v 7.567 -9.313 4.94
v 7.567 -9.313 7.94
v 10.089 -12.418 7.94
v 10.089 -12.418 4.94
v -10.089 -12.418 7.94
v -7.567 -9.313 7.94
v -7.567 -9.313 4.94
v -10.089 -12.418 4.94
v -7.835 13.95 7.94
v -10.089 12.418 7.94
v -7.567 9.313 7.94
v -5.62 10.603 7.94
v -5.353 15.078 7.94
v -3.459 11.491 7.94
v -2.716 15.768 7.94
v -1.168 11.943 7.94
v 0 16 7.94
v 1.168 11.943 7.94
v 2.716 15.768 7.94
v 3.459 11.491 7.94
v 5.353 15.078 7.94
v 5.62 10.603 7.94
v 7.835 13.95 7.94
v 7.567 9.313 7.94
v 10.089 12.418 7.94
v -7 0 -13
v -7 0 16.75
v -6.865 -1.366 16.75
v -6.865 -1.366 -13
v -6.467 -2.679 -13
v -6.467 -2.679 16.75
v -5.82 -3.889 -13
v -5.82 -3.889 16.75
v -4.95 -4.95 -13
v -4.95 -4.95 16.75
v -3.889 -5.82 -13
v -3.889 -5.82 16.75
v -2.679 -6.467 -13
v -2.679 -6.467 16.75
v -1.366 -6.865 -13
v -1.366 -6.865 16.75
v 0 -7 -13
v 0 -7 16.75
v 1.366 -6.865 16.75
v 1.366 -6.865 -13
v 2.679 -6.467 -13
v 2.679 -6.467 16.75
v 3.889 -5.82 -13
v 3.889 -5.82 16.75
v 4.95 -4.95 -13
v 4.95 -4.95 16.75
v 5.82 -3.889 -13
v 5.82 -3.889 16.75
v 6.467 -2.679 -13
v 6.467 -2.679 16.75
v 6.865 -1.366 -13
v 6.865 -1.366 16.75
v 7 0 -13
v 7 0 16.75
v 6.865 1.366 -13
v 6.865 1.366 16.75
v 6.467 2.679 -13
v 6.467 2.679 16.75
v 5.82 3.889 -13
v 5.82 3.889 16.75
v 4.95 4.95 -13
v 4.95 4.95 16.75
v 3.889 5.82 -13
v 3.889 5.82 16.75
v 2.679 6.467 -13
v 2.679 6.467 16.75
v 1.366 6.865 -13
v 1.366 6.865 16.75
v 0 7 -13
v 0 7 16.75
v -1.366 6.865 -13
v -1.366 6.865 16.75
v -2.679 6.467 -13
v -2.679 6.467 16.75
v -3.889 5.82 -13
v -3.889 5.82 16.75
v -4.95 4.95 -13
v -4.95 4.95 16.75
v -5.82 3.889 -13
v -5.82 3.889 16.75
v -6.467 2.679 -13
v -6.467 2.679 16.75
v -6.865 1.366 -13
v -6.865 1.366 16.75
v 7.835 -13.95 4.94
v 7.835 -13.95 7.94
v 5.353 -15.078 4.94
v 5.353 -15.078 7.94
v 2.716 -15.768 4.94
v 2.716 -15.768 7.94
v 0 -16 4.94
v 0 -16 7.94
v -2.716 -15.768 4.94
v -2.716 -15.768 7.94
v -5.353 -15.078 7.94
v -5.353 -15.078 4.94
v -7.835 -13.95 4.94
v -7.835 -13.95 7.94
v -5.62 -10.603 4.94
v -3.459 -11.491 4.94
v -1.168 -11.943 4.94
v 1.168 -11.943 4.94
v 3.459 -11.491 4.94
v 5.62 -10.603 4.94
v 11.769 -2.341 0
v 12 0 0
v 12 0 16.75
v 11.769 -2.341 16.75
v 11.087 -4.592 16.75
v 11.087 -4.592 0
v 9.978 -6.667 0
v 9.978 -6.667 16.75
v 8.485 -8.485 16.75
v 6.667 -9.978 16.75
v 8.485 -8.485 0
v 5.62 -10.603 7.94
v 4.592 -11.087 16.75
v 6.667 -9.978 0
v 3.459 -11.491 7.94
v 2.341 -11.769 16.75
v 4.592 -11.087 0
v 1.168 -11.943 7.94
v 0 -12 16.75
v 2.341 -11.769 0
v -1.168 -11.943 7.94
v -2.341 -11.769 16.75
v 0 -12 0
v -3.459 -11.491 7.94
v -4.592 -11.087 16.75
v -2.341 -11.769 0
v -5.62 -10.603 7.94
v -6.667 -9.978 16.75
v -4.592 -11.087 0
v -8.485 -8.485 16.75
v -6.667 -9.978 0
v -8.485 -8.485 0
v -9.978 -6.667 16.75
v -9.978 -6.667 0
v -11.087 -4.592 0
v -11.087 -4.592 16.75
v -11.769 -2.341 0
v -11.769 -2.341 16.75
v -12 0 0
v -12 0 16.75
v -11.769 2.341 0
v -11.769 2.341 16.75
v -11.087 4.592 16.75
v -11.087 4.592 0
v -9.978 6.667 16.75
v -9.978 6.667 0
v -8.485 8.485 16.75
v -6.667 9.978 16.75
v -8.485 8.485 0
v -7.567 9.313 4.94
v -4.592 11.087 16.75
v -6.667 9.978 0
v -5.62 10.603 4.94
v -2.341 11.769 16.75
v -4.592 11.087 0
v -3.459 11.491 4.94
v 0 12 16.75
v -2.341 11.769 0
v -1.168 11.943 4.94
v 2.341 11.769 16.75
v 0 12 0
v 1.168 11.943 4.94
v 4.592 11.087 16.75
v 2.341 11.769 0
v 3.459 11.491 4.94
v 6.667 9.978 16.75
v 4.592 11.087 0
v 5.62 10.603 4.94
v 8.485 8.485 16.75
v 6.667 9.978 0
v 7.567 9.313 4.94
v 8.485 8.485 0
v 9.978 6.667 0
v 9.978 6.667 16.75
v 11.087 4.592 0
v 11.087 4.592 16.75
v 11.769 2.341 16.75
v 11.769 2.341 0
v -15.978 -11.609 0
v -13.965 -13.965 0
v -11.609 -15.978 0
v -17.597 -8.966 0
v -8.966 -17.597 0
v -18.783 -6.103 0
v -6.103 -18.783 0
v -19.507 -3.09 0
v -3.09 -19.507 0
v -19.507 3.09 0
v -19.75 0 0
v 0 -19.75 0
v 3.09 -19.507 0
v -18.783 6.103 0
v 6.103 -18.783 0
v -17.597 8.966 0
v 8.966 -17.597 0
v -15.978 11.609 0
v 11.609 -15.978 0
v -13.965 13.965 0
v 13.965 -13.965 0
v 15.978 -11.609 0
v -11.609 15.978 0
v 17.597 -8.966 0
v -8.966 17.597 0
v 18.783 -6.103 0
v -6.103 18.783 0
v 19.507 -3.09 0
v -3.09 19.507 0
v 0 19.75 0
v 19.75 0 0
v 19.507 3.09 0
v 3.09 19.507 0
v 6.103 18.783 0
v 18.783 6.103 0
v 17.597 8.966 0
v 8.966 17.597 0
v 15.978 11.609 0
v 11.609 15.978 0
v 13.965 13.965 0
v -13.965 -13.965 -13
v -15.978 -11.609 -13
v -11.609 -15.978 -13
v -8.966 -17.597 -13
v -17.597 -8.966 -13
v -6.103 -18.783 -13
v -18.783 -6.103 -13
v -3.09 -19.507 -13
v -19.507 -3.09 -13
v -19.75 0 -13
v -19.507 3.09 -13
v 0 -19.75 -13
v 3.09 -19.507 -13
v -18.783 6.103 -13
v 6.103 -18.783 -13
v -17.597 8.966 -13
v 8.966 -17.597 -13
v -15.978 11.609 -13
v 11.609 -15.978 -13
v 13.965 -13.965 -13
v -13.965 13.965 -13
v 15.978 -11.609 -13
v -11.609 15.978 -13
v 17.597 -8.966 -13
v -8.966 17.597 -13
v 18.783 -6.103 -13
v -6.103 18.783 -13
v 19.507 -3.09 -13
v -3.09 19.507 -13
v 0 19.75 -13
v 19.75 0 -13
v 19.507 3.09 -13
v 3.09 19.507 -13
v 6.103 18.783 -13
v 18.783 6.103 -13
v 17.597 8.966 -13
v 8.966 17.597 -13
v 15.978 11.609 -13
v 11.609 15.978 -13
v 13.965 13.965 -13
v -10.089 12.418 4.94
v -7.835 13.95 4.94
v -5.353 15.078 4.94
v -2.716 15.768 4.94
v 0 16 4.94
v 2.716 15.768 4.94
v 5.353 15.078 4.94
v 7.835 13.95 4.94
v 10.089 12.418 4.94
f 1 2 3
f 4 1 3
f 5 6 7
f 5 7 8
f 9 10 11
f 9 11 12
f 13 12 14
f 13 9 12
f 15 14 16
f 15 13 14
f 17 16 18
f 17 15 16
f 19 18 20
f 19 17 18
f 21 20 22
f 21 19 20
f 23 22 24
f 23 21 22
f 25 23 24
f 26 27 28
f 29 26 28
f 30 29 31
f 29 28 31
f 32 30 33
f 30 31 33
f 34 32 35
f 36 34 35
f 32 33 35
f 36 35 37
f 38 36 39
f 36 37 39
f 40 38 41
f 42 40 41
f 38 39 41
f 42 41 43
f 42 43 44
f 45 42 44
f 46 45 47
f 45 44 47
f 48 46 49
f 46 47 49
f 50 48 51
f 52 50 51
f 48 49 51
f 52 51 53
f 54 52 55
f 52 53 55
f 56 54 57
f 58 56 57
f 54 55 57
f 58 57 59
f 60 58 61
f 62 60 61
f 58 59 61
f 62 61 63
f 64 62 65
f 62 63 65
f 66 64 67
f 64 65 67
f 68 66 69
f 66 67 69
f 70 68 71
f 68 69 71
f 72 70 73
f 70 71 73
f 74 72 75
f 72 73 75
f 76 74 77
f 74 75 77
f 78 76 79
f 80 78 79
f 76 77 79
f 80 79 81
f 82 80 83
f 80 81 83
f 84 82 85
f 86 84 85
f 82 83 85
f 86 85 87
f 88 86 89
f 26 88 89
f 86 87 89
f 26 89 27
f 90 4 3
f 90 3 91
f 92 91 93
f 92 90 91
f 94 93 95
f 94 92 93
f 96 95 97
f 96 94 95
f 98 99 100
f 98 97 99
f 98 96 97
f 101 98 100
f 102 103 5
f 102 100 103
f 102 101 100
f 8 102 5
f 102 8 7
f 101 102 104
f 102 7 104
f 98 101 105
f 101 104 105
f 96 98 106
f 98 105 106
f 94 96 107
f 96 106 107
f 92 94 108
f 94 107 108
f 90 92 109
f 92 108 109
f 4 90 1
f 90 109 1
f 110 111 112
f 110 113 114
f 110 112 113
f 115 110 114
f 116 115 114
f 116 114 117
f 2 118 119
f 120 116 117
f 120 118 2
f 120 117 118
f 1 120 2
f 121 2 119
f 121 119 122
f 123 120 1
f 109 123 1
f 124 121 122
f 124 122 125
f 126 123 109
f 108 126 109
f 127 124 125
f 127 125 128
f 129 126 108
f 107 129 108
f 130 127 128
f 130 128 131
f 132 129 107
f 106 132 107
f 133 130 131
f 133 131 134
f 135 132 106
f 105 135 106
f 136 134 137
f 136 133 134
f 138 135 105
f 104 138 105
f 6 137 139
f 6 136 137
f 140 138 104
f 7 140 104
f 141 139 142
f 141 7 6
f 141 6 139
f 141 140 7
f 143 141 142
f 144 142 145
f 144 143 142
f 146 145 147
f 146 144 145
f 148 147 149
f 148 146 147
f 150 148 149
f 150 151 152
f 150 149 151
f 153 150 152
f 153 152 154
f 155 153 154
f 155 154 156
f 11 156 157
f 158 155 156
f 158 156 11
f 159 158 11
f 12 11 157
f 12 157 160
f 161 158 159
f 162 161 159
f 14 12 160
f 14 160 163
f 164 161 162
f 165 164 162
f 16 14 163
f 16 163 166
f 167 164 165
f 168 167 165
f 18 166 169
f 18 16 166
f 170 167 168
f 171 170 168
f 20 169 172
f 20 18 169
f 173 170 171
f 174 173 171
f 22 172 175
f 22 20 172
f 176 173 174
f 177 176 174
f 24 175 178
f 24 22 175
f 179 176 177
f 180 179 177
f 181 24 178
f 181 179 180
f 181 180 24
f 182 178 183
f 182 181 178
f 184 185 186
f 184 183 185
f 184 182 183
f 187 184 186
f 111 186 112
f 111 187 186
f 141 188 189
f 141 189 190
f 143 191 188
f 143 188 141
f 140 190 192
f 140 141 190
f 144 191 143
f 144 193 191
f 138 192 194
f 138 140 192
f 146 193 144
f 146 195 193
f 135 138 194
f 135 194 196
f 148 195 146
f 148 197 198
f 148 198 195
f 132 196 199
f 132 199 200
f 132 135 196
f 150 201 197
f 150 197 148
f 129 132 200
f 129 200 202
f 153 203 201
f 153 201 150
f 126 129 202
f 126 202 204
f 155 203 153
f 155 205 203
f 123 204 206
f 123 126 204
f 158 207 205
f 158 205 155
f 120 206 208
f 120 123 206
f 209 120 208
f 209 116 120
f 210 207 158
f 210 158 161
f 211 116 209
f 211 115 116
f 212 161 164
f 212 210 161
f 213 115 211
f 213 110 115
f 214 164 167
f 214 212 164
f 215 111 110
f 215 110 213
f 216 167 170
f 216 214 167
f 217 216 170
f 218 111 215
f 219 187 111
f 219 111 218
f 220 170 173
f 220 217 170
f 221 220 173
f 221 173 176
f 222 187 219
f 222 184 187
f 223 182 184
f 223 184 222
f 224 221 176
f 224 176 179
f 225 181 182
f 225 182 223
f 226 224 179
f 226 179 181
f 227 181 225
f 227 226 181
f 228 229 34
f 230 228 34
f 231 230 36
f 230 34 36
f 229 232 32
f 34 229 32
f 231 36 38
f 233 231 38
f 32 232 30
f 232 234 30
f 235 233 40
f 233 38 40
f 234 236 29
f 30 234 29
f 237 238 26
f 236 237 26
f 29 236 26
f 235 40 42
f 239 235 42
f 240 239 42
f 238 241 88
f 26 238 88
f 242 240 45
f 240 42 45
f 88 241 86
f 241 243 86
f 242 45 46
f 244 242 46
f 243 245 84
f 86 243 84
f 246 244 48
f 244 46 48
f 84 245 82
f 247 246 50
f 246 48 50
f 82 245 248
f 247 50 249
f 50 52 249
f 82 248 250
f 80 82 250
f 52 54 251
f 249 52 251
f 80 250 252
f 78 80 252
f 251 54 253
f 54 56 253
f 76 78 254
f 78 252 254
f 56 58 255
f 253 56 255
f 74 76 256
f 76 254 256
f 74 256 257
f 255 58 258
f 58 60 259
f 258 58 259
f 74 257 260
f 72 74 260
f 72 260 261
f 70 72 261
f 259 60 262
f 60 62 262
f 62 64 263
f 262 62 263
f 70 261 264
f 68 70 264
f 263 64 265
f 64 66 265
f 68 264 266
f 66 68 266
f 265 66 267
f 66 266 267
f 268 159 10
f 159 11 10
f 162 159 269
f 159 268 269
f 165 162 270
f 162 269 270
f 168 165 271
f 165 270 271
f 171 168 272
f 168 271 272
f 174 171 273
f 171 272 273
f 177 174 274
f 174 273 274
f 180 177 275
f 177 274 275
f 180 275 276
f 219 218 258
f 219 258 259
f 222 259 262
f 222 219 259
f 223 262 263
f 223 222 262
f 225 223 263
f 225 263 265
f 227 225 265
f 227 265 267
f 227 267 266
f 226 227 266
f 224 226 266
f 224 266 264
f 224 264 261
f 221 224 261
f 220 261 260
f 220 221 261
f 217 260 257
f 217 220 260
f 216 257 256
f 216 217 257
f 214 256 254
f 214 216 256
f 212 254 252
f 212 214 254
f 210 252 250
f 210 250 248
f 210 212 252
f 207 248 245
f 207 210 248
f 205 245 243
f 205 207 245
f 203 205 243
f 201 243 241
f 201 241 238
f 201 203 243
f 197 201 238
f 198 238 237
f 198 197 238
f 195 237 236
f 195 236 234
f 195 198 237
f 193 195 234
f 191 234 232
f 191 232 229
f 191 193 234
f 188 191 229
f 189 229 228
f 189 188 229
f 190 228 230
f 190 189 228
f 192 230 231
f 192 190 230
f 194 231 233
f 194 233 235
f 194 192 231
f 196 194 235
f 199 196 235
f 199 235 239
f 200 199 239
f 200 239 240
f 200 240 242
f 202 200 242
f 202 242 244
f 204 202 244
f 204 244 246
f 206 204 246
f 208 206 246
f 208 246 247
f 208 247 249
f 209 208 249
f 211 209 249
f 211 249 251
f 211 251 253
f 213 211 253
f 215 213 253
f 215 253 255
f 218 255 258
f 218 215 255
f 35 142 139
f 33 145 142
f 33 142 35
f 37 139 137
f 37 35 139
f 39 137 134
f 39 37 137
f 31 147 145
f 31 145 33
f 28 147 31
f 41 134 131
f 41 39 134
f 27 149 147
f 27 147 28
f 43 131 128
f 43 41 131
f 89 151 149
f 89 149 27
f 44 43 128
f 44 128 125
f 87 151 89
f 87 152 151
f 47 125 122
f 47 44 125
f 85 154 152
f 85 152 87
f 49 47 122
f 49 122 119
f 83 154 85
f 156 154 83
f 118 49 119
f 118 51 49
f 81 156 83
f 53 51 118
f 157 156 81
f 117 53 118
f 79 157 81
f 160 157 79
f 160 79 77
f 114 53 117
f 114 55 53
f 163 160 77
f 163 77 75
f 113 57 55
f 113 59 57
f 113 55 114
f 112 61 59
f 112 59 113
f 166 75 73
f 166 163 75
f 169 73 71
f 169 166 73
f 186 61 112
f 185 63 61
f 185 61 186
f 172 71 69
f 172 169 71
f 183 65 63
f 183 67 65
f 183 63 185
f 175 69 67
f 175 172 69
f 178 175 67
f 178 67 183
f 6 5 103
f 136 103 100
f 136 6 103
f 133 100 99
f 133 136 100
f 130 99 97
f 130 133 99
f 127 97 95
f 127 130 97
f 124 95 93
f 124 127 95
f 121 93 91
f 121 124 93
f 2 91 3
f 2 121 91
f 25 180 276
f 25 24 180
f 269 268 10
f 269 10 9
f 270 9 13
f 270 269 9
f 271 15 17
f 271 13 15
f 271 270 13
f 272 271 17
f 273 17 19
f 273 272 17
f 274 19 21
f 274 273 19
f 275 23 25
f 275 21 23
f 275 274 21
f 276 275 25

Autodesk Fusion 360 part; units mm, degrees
sketch "Sketch1" plane through (0, 0, 0) normal (0, 0, 1) x (1, 0, 0)
  circle A0 centre (0, 0) radius 12
  dimension "d1" = 24
extrude "Extrude1" add sketch "Sketch1" along normal blind 16.75 makes body 1
sketch "Sketch2" plane through (0, 0, 0) normal (0, 0, 1) x (1, 0, 0)
  circle A0 centre (0, 0) radius 19.75
  dimension "d4" = 39.5
extrude "Extrude2" add sketch "Sketch2" against normal blind 13 bodies 1
sketch "Sketch3" plane through (0, 0, 0) normal (0, 1, 0) x (1, 0, 0)
  line L0 (0, 0) -> (0, -4.94)
  dimension "d7" = 4.94
sketch "Sketch4" plane through (0, 0, 16.75) normal (0, 0, 1) x (-1, 0, 0)
  circle A0 centre (0, 0) radius 12
sketch "Sketch5" plane through (0, 0, 0) normal (0, 1, 0) x (1, 0, 0)
sketch "Sketch6" plane through (0, 0, 0) normal (0, 0, 1) x (1, 0, 0)
  circle A0 centre (0, 0) radius 16
  dimension "d9" = 32
extrude "Extrude3" add sketch "Sketch6" along normal blind 3 separate body makes body 2
move_body "Move1" bodies 2 to x (1, 0, 0) y (0, 1, 0) z (0, 0, 1) at (0, 0, 4.94)
sketch "Sketch7" plane through (0, 0, 7.94) normal (0, 0, 1) x (-1, 0, 0)
  circle A0 centre (0, 0) radius 16
  line L0 (0, 0) -> (13, 16)
  line L1 (0, -2.5) -> (0, -20)
  line L2 (0, 0) -> (-13, 16)
  line L3 (-20, 0) -> (-2.5, 0)
  line L4 (0, 0) -> (13, -16)
  line L5 (0, 0) -> (-13, -16)
  line L6 (-13, 16) -> (-22, 6)
  line L7 (-22, 6) -> (-13, -16)
  line L8 (13, 16) -> (27, 0)
  line L9 (27, 0) -> (13, -16)
extrude "Extrude4" cut sketch "Sketch7" against normal blind 4 contours A0 L0 L4 | A0 L0 L4 L8 L9 | A0 L2 L5 | A0 L2 L3 L6 L7 | A0 L3 L5 L7 bodies 2
sketch "Sketch8" plane through (0, 0, 16.75) normal (0, 0, 1) x (-1, 0, 0)
  circle A0 centre (0, 0) radius 7
  dimension "d14" = 14
extrude "Extrude5" cut sketch "Sketch8" against normal blind 33 bodies 1 2 makes body 3 at (-4.4893, -12.169, 7.94)
combine "Combine1" operation add target body 1 tool bodies 2 3
